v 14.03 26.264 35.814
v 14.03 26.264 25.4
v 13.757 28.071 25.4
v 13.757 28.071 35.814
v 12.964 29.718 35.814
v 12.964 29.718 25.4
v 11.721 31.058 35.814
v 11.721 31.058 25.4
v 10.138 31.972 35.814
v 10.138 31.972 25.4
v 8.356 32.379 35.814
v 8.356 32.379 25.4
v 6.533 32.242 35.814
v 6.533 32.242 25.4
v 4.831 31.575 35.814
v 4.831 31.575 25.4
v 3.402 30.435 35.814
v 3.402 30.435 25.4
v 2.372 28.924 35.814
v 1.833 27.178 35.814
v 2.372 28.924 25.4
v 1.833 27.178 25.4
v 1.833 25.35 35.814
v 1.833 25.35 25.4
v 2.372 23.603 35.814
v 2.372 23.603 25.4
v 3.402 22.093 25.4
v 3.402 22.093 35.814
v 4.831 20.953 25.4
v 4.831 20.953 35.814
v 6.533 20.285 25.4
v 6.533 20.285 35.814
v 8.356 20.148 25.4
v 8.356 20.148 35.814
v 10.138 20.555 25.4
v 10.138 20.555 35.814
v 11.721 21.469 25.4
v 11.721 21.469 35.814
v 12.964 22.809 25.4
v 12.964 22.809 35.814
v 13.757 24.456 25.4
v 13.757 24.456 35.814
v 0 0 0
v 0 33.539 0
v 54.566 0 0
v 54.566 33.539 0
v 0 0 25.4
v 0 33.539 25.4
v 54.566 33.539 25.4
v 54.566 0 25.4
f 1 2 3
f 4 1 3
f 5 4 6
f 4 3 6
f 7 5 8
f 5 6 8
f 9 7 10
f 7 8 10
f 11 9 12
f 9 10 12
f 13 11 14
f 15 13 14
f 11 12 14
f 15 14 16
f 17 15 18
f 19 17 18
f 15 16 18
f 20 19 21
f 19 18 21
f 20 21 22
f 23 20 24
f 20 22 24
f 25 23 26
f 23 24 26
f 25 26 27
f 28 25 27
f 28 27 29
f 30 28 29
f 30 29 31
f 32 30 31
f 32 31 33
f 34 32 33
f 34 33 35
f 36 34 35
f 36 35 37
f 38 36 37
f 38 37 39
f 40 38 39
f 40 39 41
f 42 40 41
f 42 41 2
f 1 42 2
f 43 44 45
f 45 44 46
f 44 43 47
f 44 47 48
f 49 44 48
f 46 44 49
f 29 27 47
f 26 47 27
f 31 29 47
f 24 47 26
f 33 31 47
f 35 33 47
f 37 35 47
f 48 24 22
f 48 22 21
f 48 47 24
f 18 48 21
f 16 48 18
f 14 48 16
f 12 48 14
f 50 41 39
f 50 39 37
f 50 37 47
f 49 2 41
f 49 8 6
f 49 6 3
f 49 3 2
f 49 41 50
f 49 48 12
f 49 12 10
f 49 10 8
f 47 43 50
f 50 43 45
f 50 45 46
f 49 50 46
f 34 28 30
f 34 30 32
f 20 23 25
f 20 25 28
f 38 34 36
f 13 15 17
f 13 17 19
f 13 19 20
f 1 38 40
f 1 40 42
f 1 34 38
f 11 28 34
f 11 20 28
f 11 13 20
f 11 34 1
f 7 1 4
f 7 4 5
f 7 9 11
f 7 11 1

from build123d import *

# Parameters (mm, degrees)
F0_W     = 54.566301
F0_H     = 33.538647
F1_DEPTH = 25.4
F2_R     = 6.13249
F3_DEPTH = 35.814


with BuildPart() as f1:
    # F0 (on Top) → F1 (new body)
    with BuildSketch(Plane.XY):
        with Locations((27.28315, 16.769323)):
            Rectangle(F0_W, F0_H)
    extrude(amount=F1_DEPTH)

    # F2 (on Top) → F3 (join)
    with BuildSketch(Plane.XY):
        with Locations((7.89733, 26.263695)):
            Circle(F2_R)
    extrude(amount=F3_DEPTH)


solid = f1.part
